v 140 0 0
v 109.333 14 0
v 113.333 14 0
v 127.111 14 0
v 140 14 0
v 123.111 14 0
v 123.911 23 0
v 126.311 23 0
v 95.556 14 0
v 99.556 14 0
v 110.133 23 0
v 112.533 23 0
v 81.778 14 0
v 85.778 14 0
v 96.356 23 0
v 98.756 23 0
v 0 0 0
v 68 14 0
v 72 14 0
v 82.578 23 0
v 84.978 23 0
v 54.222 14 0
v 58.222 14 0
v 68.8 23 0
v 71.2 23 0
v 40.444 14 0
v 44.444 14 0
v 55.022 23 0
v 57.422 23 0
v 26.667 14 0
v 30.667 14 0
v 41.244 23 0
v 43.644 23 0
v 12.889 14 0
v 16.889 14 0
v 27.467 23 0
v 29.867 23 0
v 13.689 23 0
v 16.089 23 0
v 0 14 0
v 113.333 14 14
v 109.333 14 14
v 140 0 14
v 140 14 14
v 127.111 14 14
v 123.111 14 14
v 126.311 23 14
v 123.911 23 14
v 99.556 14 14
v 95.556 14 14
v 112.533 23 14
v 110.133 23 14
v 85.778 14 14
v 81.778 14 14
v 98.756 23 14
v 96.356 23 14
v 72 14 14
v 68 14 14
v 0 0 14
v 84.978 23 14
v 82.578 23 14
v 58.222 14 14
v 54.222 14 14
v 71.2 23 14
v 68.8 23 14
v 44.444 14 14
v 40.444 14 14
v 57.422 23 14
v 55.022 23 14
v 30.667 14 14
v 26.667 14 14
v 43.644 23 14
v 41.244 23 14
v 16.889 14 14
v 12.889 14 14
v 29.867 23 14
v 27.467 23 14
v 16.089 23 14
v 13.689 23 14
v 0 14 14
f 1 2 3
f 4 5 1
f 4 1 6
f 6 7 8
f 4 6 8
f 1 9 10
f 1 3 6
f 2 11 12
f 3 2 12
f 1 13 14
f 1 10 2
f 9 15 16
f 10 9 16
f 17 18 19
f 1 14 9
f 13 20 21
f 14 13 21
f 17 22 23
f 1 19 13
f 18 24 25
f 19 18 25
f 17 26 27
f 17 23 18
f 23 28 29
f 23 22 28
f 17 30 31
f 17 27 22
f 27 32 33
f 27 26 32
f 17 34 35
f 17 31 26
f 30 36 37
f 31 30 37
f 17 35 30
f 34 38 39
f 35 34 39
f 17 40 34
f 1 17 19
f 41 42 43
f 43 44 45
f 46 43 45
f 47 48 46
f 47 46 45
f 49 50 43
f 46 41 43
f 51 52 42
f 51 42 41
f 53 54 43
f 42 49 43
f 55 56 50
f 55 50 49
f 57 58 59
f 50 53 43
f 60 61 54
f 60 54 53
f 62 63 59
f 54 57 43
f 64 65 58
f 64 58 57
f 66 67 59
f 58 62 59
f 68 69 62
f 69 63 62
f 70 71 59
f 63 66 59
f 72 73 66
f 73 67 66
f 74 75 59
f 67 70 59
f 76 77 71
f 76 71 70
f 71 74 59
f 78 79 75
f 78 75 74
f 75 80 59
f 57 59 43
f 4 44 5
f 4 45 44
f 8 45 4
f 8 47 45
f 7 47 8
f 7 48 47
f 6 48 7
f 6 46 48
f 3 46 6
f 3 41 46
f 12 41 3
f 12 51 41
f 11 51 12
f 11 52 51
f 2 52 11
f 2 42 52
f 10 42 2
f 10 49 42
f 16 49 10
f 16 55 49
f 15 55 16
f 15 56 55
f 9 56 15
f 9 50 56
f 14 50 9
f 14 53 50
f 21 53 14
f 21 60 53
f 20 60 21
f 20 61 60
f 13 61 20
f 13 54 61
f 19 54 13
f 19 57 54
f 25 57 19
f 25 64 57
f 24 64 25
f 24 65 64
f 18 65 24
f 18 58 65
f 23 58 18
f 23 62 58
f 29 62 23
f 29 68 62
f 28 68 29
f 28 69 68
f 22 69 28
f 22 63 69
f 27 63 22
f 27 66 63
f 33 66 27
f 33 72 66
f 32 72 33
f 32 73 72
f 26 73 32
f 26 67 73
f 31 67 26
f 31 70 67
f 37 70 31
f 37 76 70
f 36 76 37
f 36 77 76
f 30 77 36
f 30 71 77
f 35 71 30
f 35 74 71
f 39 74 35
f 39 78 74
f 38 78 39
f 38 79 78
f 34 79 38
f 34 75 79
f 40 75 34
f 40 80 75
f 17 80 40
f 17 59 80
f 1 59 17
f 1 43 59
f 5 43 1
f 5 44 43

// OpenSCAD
$fn = 32;

// ----------------------------------------------------------------------
// Gear rack: 9 teeth on a 140 mm bar, pitch 13.78 mm
// ----------------------------------------------------------------------

// --- parameters (mm) ---
profile_height = 14;      // extrusion height
profile_points = 40;      // points of the closed outline

profile = [[0, 0], [140, 0], [140, 14], [127.111, 14], [126.311, 23], [123.911, 23], [123.111, 14], [113.333, 14], [112.533, 23], [110.133, 23], [109.333, 14], [99.556, 14], [98.756, 23], [96.356, 23], [95.556, 14], [85.778, 14], [84.978, 23], [82.578, 23], [81.778, 14], [72, 14], [71.2, 23], [68.8, 23], [68, 14], [58.222, 14], [57.422, 23], [55.022, 23], [54.222, 14], [44.444, 14], [43.644, 23], [41.244, 23], [40.444, 14], [30.667, 14], [29.867, 23], [27.467, 23], [26.667, 14], [16.889, 14], [16.089, 23], [13.689, 23], [12.889, 14], [0, 14]];  // single closed polygon, 40 points, counter clockwise

// --- the one profile operation ---
linear_extrude(height = profile_height) polygon(points = profile);
